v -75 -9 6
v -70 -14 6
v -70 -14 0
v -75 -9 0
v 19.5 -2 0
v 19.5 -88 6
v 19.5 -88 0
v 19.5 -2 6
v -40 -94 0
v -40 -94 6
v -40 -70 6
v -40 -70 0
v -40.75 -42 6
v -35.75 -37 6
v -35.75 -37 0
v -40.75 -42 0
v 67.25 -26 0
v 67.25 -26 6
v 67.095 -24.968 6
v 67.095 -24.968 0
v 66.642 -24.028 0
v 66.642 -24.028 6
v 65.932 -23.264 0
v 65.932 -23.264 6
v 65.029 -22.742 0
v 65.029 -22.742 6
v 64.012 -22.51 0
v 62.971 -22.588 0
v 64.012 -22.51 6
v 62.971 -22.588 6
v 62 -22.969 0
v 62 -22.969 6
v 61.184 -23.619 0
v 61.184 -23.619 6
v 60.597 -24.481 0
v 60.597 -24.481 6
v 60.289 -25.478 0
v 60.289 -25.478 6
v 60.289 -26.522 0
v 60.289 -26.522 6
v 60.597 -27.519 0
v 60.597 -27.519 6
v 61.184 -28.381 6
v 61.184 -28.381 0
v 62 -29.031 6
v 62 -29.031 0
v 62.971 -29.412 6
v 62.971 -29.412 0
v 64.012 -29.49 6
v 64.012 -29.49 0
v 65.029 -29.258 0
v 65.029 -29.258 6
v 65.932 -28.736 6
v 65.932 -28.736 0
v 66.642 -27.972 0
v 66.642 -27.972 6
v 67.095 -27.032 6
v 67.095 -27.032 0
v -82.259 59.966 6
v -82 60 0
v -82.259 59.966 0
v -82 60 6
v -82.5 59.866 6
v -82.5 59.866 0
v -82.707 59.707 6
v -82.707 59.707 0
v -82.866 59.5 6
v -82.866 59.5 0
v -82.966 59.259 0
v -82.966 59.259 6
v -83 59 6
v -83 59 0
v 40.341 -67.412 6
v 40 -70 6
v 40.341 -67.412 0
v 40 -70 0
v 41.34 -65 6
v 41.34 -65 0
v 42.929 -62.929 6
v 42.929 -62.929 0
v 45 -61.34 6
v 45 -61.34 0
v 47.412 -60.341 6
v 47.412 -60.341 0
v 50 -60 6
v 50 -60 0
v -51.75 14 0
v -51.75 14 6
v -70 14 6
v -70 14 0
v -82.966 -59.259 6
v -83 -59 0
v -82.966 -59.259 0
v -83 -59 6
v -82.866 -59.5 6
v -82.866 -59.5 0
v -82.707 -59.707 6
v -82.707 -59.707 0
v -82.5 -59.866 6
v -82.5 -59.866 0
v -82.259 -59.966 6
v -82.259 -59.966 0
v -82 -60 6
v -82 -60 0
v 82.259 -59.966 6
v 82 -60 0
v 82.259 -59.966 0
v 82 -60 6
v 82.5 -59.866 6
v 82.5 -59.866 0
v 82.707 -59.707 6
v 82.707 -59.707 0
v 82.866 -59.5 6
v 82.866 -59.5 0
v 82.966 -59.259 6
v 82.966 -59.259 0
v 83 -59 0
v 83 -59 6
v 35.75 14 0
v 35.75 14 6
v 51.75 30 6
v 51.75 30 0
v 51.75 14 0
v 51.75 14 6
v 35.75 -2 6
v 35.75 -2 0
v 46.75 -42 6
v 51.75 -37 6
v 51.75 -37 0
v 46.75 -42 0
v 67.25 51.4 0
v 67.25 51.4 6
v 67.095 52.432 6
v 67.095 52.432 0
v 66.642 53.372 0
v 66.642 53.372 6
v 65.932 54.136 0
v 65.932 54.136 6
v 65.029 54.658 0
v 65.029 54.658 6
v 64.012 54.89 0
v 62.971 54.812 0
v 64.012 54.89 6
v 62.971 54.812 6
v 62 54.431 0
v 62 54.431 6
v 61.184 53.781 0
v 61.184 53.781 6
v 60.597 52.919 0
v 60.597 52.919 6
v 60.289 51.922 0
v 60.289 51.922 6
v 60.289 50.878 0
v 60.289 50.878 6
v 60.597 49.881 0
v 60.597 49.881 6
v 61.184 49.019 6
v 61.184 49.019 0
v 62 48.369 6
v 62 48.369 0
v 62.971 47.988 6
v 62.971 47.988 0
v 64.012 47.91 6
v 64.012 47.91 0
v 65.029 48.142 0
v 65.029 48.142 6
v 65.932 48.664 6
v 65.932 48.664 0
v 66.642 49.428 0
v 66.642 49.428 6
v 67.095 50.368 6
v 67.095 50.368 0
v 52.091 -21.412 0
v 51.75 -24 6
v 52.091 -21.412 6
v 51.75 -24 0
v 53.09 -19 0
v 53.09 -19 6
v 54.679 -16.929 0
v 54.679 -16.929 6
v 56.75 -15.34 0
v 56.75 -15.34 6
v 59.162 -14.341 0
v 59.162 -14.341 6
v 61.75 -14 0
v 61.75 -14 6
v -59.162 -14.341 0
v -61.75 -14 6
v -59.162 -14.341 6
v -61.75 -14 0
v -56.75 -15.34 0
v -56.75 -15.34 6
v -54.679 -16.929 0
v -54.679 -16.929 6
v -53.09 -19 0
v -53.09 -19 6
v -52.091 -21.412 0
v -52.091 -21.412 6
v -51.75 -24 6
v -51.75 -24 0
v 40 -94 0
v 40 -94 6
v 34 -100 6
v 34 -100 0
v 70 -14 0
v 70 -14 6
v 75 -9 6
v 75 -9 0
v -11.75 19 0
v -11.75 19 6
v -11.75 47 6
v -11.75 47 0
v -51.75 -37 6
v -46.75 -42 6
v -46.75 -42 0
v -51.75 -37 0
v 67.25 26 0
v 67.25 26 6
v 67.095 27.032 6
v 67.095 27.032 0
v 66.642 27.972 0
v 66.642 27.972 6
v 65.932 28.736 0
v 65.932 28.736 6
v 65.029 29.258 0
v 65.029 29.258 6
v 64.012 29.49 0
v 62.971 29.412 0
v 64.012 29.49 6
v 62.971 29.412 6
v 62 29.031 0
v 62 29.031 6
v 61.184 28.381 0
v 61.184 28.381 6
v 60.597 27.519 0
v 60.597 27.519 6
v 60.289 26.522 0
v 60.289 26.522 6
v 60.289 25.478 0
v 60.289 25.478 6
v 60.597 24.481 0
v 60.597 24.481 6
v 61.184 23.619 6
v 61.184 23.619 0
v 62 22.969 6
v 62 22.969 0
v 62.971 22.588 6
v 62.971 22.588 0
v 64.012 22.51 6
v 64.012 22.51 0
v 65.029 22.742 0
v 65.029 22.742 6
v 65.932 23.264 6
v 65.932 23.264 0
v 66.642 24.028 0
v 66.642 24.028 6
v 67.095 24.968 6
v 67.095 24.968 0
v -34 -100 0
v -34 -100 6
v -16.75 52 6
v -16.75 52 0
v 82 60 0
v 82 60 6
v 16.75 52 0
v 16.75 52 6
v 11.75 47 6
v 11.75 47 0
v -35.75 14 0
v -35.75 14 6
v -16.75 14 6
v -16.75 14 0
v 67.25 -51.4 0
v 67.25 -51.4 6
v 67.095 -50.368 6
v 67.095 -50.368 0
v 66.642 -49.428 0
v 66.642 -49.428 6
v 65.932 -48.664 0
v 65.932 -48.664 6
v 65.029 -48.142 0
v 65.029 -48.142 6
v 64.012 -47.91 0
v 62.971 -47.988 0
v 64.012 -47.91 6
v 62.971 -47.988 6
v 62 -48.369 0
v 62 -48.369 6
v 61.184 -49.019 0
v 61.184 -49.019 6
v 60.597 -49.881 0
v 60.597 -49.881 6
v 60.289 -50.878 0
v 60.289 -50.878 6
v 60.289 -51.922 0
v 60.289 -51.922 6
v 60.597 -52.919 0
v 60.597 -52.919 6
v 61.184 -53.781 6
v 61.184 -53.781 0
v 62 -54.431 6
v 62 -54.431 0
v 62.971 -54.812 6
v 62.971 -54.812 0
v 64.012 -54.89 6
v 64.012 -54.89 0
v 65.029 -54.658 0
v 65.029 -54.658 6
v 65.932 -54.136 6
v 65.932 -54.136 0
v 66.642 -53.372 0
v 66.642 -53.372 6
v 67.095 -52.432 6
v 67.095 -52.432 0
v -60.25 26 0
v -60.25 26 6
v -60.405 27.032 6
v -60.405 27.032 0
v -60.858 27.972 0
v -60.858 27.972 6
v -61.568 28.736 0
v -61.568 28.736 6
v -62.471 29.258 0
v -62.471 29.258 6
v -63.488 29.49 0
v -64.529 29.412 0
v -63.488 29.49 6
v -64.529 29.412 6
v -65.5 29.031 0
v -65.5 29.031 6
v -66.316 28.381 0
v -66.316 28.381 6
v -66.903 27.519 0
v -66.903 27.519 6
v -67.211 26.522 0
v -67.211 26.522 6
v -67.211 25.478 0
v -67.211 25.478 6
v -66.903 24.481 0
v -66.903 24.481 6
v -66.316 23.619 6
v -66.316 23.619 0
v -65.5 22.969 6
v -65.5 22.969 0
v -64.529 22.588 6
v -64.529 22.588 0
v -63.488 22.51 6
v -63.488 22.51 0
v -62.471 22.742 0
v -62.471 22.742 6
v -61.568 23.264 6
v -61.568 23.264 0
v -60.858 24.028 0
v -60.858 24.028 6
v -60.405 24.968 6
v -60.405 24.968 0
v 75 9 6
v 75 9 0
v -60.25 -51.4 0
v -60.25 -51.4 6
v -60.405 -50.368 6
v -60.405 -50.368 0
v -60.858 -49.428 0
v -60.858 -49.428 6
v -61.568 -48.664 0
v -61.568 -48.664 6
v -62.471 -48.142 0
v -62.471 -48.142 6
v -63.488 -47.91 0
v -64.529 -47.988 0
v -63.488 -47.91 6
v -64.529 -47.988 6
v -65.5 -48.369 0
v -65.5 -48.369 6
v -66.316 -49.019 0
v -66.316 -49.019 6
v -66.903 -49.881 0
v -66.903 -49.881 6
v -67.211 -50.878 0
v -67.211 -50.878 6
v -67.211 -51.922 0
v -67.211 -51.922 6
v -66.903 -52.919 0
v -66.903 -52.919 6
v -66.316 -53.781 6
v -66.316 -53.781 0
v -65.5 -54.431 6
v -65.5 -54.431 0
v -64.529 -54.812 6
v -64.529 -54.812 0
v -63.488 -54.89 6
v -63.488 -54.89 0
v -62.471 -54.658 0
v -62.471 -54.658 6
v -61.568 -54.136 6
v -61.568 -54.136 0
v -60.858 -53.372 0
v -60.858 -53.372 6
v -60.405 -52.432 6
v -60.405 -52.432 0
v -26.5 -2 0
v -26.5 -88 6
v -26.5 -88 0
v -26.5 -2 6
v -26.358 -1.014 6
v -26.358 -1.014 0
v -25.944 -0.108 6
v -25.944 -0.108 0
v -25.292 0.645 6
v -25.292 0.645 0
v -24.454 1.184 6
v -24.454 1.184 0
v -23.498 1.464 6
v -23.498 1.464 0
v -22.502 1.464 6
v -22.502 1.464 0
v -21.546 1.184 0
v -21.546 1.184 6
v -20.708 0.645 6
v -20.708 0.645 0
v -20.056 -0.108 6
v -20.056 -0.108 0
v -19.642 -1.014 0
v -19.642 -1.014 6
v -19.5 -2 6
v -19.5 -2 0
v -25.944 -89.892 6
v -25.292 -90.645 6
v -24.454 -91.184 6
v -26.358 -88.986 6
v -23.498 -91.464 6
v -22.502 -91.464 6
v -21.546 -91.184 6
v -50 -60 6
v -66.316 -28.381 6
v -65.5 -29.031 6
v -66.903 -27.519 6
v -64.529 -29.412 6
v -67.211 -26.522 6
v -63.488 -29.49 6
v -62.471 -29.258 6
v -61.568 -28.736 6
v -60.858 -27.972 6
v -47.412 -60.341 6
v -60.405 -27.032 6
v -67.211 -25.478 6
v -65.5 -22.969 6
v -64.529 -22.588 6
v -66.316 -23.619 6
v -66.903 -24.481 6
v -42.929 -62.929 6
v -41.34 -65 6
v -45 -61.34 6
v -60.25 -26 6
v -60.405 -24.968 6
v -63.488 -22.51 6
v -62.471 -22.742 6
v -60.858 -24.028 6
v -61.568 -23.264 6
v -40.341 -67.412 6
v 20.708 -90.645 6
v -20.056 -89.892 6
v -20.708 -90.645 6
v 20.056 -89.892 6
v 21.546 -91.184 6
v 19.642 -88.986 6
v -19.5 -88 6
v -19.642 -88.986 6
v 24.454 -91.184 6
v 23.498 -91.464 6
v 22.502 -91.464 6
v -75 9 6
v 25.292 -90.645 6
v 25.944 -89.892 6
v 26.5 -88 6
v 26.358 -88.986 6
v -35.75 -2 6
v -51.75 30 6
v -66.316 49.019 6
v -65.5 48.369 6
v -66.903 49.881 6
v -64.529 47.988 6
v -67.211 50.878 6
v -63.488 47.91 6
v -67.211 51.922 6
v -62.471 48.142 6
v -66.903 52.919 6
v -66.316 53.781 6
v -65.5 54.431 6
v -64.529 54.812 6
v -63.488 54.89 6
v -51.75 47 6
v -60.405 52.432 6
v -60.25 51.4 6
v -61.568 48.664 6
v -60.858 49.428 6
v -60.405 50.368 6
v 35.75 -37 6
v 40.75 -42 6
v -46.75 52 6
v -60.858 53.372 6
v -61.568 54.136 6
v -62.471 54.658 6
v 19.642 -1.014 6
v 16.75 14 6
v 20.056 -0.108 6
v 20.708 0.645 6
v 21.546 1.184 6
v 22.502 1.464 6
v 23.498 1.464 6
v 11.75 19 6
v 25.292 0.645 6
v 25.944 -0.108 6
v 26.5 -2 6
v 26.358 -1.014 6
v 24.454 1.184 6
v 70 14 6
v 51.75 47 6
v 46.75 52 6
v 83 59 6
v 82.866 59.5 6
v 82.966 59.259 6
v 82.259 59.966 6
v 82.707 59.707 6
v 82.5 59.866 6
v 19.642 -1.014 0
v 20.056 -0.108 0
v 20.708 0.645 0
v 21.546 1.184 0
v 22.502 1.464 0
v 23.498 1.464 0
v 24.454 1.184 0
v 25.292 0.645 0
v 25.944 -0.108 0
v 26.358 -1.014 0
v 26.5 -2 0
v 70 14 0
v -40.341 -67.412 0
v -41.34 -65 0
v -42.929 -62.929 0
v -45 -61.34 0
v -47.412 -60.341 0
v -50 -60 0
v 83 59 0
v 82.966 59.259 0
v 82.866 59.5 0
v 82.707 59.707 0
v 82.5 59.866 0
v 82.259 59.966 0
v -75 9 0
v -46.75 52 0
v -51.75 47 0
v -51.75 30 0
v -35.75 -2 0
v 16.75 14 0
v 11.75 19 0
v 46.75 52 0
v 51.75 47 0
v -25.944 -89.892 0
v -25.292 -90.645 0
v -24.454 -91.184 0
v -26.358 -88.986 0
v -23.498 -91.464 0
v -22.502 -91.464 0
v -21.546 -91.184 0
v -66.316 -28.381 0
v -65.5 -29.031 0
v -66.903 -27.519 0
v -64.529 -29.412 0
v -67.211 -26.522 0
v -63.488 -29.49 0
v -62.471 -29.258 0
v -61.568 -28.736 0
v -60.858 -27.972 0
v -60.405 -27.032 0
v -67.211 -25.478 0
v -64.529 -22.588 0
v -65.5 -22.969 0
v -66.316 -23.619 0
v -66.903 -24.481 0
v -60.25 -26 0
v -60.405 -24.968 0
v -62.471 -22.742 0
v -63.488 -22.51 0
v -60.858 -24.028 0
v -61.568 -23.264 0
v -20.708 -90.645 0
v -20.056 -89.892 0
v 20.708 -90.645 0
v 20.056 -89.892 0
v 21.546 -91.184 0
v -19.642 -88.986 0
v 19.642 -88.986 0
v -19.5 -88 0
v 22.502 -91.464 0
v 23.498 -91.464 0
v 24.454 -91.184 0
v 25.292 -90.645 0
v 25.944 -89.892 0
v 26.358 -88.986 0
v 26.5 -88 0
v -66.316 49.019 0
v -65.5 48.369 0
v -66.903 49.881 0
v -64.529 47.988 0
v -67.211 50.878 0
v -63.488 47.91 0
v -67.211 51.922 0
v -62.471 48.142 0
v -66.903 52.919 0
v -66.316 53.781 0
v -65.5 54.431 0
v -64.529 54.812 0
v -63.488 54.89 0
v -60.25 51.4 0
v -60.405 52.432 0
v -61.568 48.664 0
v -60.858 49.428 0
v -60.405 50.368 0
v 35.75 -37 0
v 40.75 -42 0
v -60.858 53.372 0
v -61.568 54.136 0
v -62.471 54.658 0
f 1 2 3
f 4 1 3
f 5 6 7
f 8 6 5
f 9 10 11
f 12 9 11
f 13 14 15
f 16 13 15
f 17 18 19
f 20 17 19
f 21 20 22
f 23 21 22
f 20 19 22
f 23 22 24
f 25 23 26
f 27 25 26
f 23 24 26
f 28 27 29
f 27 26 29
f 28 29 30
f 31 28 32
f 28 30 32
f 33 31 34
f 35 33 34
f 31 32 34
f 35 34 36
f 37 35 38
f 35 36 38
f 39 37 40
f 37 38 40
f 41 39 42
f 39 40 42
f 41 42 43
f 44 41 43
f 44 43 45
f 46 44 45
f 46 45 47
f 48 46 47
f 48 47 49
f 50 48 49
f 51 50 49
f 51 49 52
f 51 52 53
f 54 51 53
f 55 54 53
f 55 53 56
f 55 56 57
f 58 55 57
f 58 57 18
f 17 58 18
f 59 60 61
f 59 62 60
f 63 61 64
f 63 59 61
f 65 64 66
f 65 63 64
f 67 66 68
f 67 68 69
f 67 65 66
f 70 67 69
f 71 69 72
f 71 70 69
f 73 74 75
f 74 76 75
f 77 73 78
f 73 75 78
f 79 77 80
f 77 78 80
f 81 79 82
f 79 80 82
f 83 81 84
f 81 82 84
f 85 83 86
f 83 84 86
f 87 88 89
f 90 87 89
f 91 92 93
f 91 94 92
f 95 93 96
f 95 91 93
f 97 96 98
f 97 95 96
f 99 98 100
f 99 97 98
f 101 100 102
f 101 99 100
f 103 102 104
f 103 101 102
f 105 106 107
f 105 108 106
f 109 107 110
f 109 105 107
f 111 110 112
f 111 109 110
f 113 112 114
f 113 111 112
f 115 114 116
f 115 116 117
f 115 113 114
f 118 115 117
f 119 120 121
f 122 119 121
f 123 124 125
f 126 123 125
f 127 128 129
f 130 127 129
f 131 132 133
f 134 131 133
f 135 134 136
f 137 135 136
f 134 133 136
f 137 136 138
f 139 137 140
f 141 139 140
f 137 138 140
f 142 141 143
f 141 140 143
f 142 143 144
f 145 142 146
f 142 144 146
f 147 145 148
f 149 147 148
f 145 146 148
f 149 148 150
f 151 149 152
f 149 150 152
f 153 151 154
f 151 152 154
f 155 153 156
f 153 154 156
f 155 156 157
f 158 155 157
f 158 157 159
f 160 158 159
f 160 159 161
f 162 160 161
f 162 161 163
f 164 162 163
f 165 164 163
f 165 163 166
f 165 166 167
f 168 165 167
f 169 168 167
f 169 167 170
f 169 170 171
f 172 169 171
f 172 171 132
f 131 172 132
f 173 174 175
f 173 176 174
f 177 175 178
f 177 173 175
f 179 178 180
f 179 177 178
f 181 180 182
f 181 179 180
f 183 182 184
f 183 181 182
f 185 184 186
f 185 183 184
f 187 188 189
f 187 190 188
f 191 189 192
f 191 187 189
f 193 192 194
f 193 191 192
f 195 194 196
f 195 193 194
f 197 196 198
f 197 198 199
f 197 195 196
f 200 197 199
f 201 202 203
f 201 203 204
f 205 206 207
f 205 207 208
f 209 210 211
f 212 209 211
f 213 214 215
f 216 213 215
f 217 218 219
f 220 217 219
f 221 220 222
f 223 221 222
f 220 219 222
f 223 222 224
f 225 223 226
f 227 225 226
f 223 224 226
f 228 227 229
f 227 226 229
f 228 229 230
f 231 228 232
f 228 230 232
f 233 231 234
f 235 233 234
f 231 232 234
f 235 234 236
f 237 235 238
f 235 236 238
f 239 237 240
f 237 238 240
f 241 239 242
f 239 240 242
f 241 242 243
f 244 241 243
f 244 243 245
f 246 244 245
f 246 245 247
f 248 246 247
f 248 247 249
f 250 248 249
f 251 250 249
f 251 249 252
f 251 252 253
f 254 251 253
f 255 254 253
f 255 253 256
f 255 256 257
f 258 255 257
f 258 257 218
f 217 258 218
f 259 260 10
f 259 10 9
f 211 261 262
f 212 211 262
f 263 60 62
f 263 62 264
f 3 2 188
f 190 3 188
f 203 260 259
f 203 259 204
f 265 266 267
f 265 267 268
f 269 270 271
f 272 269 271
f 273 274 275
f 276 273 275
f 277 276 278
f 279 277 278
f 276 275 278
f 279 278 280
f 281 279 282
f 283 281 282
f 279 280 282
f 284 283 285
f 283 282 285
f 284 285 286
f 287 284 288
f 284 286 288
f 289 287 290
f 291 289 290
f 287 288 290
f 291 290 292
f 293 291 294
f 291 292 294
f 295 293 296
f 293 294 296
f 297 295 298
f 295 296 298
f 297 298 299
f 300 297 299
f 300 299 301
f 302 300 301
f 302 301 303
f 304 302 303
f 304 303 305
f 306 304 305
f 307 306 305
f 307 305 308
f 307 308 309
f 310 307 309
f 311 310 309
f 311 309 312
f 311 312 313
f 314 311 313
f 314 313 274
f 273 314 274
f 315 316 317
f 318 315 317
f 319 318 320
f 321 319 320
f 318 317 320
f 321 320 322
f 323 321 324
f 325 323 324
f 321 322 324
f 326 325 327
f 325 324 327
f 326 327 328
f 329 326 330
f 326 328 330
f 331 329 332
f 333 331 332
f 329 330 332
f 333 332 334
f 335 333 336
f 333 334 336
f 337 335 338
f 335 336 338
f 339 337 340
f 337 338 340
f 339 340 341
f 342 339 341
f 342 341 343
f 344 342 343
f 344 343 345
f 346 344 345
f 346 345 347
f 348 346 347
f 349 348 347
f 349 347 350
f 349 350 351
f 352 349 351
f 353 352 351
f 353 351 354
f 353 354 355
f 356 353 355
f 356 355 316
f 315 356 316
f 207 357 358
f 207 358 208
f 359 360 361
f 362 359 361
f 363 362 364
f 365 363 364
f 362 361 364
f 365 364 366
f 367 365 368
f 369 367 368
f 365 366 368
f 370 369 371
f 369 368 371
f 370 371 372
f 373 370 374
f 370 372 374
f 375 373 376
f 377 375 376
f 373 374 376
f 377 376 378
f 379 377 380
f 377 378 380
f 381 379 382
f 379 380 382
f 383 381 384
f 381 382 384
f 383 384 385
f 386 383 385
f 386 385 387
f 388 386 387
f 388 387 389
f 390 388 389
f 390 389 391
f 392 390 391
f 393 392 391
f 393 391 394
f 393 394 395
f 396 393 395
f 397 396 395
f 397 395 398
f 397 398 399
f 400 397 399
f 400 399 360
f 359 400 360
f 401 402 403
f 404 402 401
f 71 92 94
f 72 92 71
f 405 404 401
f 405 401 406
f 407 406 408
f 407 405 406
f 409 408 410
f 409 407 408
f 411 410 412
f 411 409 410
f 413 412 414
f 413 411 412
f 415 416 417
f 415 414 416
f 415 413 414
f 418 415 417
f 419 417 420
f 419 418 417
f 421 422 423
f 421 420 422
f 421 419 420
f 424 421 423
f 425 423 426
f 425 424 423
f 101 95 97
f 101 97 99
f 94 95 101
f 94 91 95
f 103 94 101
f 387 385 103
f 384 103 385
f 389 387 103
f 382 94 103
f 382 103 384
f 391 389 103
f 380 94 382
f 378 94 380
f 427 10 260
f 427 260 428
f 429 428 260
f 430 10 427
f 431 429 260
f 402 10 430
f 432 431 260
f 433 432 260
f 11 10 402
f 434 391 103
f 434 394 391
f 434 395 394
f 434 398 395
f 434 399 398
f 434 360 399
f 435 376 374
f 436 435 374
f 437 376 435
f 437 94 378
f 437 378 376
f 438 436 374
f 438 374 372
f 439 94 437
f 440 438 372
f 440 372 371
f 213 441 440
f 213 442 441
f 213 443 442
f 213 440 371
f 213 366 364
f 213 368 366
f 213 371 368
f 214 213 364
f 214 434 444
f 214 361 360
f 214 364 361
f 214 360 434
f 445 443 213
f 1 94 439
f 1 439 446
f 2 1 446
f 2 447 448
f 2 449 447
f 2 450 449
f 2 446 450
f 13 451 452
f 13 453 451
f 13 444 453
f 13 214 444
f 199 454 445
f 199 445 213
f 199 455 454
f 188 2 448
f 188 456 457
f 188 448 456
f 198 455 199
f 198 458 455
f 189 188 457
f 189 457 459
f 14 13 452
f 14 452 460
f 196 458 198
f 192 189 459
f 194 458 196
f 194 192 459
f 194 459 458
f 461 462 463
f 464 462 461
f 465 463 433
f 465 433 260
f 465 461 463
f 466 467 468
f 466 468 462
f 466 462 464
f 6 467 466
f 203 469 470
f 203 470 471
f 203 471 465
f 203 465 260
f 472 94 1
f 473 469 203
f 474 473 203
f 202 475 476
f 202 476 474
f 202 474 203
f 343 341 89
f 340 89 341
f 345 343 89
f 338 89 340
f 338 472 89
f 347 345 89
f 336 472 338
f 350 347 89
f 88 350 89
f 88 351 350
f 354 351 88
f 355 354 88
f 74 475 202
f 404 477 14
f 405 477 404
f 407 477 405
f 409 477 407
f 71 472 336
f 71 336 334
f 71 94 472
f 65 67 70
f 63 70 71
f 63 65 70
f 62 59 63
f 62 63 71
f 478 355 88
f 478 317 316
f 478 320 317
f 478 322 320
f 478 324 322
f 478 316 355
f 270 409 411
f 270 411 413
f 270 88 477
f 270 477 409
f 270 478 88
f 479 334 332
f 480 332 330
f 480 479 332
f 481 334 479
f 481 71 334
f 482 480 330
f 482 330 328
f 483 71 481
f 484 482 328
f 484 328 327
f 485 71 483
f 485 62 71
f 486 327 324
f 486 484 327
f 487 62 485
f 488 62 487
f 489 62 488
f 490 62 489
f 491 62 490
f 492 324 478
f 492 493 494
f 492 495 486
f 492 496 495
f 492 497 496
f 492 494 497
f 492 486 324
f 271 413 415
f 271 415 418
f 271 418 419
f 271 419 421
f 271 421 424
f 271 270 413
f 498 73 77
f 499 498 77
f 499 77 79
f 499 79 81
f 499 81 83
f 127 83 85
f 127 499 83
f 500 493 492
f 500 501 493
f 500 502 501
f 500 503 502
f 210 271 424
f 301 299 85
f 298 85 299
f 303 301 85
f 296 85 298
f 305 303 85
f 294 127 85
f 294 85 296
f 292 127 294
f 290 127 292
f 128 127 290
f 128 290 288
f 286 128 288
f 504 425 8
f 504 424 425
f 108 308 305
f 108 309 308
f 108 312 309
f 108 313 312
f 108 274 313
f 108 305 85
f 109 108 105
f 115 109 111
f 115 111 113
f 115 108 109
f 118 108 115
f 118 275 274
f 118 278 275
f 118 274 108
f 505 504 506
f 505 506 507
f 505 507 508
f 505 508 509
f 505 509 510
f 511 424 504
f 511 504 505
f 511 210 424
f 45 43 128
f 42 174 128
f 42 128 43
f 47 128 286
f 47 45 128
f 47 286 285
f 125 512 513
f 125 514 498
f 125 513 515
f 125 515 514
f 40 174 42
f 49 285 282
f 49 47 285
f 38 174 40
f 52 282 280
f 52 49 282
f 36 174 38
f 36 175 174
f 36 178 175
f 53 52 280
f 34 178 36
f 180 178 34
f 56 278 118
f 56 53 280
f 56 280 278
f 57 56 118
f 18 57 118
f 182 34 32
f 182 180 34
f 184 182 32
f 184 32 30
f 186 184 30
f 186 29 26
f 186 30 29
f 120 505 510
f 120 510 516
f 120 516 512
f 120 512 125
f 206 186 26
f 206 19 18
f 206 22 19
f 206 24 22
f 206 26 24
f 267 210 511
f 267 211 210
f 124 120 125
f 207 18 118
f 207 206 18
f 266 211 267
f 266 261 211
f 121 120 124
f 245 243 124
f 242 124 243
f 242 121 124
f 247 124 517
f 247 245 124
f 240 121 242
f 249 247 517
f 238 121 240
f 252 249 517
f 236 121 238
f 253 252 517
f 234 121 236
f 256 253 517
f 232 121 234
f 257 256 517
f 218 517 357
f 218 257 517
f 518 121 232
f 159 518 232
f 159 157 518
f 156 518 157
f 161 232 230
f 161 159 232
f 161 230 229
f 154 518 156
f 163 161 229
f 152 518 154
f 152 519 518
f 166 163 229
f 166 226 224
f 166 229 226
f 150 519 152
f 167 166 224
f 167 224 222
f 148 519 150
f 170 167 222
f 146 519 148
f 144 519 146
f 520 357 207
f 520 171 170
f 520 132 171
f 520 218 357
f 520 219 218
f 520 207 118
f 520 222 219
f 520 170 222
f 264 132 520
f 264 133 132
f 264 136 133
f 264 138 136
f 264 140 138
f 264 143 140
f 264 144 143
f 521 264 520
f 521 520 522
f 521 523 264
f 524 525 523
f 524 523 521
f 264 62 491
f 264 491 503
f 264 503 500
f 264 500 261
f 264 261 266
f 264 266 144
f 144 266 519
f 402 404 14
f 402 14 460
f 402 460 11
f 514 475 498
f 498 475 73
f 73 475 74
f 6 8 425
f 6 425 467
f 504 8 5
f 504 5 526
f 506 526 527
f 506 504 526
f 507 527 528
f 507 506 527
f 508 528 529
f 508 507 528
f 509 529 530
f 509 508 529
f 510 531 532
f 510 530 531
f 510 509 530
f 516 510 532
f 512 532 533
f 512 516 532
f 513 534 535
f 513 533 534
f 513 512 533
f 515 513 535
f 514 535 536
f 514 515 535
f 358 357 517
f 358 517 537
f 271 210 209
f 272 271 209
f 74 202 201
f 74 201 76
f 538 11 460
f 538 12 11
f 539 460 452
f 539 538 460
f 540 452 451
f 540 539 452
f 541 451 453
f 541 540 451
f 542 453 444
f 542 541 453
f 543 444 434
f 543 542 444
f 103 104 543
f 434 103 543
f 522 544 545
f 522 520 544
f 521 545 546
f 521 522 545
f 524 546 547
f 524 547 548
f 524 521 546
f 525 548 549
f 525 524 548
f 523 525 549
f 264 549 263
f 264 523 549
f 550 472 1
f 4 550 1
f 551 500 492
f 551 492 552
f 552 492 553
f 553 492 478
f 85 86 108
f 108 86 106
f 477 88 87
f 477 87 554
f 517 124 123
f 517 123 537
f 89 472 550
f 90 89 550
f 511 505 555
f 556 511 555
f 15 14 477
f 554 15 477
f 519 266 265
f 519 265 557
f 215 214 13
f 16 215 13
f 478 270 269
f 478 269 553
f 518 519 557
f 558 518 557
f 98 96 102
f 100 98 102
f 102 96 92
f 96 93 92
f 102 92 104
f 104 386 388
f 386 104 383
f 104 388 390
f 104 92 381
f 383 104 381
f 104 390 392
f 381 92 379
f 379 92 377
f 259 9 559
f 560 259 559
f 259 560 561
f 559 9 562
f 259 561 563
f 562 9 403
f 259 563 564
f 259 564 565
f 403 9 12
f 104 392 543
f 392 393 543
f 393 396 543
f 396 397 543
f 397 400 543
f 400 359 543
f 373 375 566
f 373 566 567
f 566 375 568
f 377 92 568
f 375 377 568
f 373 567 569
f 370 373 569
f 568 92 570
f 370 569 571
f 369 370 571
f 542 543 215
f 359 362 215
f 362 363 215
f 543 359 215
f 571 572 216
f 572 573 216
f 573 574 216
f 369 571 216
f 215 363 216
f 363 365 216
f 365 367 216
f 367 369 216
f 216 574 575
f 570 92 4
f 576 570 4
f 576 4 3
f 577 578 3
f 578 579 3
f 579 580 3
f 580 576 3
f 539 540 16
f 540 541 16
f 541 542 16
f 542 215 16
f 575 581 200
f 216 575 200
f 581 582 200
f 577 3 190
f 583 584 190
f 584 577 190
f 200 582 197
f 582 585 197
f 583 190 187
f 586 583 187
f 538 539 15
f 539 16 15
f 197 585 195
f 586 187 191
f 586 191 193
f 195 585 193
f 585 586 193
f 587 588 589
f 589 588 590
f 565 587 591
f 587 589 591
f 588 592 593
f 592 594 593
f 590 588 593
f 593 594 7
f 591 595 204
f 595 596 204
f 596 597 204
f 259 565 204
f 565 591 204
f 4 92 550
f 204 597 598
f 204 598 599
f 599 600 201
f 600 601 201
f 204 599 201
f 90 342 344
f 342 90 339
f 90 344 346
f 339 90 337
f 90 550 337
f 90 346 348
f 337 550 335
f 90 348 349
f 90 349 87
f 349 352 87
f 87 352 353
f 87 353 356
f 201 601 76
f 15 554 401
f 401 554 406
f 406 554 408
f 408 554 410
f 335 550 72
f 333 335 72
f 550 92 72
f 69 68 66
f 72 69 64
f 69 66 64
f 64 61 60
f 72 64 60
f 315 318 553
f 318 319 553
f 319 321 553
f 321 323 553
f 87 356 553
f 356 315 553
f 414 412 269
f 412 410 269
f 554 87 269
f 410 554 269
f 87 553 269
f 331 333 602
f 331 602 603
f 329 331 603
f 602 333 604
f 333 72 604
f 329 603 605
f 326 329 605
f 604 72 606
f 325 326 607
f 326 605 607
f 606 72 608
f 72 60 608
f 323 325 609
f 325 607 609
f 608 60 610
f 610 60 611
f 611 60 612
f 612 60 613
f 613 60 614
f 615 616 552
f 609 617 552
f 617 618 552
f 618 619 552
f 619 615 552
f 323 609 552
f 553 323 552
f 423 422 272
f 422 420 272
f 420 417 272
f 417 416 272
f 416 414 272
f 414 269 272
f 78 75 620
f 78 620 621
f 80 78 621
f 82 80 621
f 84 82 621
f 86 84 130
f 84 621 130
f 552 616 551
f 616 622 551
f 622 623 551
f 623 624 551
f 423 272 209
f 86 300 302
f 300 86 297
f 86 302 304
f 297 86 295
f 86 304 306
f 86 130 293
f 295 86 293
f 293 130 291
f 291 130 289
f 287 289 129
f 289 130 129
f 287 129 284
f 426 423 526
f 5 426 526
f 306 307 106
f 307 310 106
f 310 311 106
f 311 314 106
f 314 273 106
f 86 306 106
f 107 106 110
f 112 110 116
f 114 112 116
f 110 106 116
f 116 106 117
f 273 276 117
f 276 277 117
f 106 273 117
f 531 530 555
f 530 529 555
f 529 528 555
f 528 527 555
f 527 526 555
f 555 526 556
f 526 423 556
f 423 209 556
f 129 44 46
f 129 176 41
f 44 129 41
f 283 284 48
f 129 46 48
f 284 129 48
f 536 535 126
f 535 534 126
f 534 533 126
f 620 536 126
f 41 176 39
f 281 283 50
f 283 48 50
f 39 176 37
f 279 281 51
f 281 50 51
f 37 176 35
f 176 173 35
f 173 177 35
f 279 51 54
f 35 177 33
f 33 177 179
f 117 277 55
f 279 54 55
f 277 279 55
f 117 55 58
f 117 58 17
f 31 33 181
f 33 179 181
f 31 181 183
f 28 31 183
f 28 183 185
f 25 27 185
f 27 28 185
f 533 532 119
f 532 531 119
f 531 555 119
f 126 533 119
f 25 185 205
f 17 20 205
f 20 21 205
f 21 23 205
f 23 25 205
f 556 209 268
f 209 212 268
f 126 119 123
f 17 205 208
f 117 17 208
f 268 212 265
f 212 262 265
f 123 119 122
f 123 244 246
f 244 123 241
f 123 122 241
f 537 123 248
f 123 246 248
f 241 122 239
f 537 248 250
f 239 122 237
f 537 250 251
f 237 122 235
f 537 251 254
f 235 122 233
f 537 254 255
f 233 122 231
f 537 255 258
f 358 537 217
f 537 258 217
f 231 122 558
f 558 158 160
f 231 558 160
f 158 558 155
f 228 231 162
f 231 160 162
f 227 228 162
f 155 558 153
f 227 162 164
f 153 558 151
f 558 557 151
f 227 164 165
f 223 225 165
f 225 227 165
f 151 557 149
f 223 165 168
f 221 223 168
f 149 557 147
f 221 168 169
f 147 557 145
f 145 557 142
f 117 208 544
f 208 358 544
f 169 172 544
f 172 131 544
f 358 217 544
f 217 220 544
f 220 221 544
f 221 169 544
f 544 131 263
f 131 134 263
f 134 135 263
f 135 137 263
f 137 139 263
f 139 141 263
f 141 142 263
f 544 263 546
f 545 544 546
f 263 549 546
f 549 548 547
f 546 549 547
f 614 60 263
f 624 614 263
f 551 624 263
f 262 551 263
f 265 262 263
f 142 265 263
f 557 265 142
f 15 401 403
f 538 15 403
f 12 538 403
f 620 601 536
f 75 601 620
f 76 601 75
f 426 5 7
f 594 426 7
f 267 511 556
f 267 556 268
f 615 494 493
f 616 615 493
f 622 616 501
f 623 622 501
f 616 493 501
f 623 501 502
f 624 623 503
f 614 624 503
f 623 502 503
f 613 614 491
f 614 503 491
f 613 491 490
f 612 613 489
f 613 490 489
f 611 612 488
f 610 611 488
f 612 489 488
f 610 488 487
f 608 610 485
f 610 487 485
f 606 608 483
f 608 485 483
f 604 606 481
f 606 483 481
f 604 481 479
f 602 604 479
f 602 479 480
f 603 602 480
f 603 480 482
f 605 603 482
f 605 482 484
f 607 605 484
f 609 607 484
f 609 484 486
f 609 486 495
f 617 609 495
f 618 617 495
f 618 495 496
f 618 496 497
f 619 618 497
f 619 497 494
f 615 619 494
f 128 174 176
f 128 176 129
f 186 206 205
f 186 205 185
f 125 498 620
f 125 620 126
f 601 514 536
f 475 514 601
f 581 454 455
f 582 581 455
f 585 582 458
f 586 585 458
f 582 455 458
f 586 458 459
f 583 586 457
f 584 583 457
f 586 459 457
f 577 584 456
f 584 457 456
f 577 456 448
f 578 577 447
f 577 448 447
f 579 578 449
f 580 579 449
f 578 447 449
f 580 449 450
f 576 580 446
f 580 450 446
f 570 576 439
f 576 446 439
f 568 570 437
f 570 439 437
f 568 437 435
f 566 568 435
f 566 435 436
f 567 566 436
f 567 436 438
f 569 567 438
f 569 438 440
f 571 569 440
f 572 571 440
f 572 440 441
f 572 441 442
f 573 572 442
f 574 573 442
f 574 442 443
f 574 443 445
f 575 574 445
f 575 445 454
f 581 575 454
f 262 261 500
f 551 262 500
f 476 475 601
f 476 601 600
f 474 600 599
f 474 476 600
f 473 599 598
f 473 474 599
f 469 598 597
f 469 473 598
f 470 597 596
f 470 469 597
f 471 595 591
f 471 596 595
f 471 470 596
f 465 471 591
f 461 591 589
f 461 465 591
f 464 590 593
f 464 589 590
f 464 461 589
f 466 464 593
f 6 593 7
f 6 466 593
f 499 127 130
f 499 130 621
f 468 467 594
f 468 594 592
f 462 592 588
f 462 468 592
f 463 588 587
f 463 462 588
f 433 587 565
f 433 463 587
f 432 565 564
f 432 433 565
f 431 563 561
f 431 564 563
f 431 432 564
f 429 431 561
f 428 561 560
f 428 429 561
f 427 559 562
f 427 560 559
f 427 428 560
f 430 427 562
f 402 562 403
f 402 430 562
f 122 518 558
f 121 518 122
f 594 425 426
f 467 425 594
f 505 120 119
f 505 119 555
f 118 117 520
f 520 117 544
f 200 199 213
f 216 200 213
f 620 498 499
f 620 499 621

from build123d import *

# Parameters (mm, degrees)
ESBO_O1_W                = 166
ESBO_O1_H                = 120
RESSALTO_EXTRUS_O1_DEPTH = 6
ESBO_O2_R                = 3.5
CORTE_EXTRUS_O1_DEPTH    = 103.591422643
ESBO_O3_W                = 80
ESBO_O3_H                = 80
RESSALTO_EXTRUS_O2_DEPTH = 6
FILETE1_R                = 10
CHANFRO1_SIZE            = 6
CORTE_EXTRUS_O2_DEPTH    = 10
CORTE_EXTRUS_O3_DEPTH    = 131.096118313
RESSALTO_EXTRUS_O3_DEPTH = 6
FILETE2_R                = 10
CHANFRO2_SIZE            = 5
FILETE3_R                = 1


with BuildPart() as part:
    # Esboço1 → Ressalto-extrusão1 (new body)
    with BuildSketch(Plane.XY):
        Rectangle(ESBO_O1_W, ESBO_O1_H)
    extrude(amount=RESSALTO_EXTRUS_O1_DEPTH)

    # Esboço2 → Corte-extrusão1 (cut, through all)
    with BuildSketch(Plane.XY.offset(6)):
        with Locations((-63.75, -51.4)):
            Circle(ESBO_O2_R)
        with Locations((-63.75, -26)):
            Circle(ESBO_O2_R)
        with Locations((-63.75, 26)):
            Circle(ESBO_O2_R)
        with Locations((-63.75, 51.4)):
            Circle(ESBO_O2_R)
        with Locations((63.75, -51.4)):
            Circle(ESBO_O2_R)
        with Locations((63.75, -26)):
            Circle(ESBO_O2_R)
        with Locations((63.75, 26)):
            Circle(ESBO_O2_R)
        with Locations((63.75, 51.4)):
            Circle(ESBO_O2_R)
    extrude(amount=-CORTE_EXTRUS_O1_DEPTH, mode=Mode.SUBTRACT)

    # Esboço3 → Ressalto-extrusão2 (add, through all)
    with BuildSketch(Plane.XY.offset(6)):
        with Locations((0, -60)):
            Rectangle(ESBO_O3_W, ESBO_O3_H)
    extrude(amount=-RESSALTO_EXTRUS_O2_DEPTH)

    # Filete1
    filete1_edges = [part.edges().sort_by_distance(p)[0] for p in [
        (40, -60, 3),
        (-40, -60, 3),
    ]]
    fillet(filete1_edges, radius=FILETE1_R)

    # Chanfro1
    chanfro1_edges = [part.edges().sort_by_distance(p)[0] for p in [
        (-40, -100, 3),
        (40, -100, 3),
    ]]
    chamfer(chanfro1_edges, length=CHANFRO1_SIZE)

    # Esboço4 → Corte-extrusão2 (cut)
    with BuildSketch(Plane.XY.offset(6)):
        with BuildLine():
            Line((-19.5, -2), (-19.5, -88))
            ThreePointArc((-19.5, -88), (-23, -91.5), (-26.5, -88))
            Line((-26.5, -88), (-26.5, -2))
            ThreePointArc((-26.5, -2), (-23, 1.5), (-19.5, -2))
        make_face()
        with BuildLine():
            Line((26.5, -2), (26.5, -88))
            ThreePointArc((26.5, -88), (23, -91.5), (19.5, -88))
            Line((19.5, -88), (19.5, -2))
            ThreePointArc((19.5, -2), (23, 1.5), (26.5, -2))
        make_face()
    extrude(amount=-CORTE_EXTRUS_O2_DEPTH, mode=Mode.SUBTRACT)

    # Esboço5 → Corte-extrusão3 (cut, through all)
    with BuildSketch(Plane.XY.offset(6)):
        Polygon((-51.75, 52), (-51.75, 14), (-75, 14), (-75, -14), (-51.75, -14), (-51.75, -42), (-35.75, -42), (-35.75, 14), (-11.75, 14), (-11.75, 52), align=None)
        Polygon((75, -14), (51.75, -14), (51.75, -42), (35.75, -42), (35.75, 14), (11.75, 14), (11.75, 52), (51.75, 52), (51.75, 14), (75, 14), align=None)
    extrude(amount=-CORTE_EXTRUS_O3_DEPTH, mode=Mode.SUBTRACT)

    # Esboço6 → Ressalto-extrusão3 (add, through all)
    with BuildSketch(Plane.XY.offset(6)):
        Polygon((-51.75, 14), (-35.75, -2), (-35.75, 14), (-51.75, 30), align=None)
        Polygon((35.75, 14), (51.75, 30), (51.75, 14), (35.75, -2), align=None)
    extrude(amount=-RESSALTO_EXTRUS_O3_DEPTH)

    # Filete2
    filete2_edges = [part.edges().sort_by_distance(p)[0] for p in [
        (-51.75, -14, 3),
        (51.75, -14, 3),
    ]]
    fillet(filete2_edges, radius=FILETE2_R)

    # Chanfro2
    chanfro2_edges = [part.edges().sort_by_distance(p)[0] for p in [
        (-51.75, 52, 3),
        (-11.75, 52, 3),
        (-11.75, 14, 3),
        (-35.75, -42, 3),
        (-51.75, -42, 3),
        (-75, -14, 3),
        (-75, 14, 3),
        (75, 14, 3),
        (75, -14, 3),
        (51.75, -42, 3),
        (35.75, -42, 3),
        (11.75, 14, 3),
        (11.75, 52, 3),
        (51.75, 52, 3),
    ]]
    chamfer(chanfro2_edges, length=CHANFRO2_SIZE)

    # Filete3
    filete3_edges = [part.edges().sort_by_distance(p)[0] for p in [
        (83, -60, 3),
        (-83, -60, 3),
        (-83, 60, 3),
        (83, 60, 3),
    ]]
    fillet(filete3_edges, radius=FILETE3_R)


solid = part.part
